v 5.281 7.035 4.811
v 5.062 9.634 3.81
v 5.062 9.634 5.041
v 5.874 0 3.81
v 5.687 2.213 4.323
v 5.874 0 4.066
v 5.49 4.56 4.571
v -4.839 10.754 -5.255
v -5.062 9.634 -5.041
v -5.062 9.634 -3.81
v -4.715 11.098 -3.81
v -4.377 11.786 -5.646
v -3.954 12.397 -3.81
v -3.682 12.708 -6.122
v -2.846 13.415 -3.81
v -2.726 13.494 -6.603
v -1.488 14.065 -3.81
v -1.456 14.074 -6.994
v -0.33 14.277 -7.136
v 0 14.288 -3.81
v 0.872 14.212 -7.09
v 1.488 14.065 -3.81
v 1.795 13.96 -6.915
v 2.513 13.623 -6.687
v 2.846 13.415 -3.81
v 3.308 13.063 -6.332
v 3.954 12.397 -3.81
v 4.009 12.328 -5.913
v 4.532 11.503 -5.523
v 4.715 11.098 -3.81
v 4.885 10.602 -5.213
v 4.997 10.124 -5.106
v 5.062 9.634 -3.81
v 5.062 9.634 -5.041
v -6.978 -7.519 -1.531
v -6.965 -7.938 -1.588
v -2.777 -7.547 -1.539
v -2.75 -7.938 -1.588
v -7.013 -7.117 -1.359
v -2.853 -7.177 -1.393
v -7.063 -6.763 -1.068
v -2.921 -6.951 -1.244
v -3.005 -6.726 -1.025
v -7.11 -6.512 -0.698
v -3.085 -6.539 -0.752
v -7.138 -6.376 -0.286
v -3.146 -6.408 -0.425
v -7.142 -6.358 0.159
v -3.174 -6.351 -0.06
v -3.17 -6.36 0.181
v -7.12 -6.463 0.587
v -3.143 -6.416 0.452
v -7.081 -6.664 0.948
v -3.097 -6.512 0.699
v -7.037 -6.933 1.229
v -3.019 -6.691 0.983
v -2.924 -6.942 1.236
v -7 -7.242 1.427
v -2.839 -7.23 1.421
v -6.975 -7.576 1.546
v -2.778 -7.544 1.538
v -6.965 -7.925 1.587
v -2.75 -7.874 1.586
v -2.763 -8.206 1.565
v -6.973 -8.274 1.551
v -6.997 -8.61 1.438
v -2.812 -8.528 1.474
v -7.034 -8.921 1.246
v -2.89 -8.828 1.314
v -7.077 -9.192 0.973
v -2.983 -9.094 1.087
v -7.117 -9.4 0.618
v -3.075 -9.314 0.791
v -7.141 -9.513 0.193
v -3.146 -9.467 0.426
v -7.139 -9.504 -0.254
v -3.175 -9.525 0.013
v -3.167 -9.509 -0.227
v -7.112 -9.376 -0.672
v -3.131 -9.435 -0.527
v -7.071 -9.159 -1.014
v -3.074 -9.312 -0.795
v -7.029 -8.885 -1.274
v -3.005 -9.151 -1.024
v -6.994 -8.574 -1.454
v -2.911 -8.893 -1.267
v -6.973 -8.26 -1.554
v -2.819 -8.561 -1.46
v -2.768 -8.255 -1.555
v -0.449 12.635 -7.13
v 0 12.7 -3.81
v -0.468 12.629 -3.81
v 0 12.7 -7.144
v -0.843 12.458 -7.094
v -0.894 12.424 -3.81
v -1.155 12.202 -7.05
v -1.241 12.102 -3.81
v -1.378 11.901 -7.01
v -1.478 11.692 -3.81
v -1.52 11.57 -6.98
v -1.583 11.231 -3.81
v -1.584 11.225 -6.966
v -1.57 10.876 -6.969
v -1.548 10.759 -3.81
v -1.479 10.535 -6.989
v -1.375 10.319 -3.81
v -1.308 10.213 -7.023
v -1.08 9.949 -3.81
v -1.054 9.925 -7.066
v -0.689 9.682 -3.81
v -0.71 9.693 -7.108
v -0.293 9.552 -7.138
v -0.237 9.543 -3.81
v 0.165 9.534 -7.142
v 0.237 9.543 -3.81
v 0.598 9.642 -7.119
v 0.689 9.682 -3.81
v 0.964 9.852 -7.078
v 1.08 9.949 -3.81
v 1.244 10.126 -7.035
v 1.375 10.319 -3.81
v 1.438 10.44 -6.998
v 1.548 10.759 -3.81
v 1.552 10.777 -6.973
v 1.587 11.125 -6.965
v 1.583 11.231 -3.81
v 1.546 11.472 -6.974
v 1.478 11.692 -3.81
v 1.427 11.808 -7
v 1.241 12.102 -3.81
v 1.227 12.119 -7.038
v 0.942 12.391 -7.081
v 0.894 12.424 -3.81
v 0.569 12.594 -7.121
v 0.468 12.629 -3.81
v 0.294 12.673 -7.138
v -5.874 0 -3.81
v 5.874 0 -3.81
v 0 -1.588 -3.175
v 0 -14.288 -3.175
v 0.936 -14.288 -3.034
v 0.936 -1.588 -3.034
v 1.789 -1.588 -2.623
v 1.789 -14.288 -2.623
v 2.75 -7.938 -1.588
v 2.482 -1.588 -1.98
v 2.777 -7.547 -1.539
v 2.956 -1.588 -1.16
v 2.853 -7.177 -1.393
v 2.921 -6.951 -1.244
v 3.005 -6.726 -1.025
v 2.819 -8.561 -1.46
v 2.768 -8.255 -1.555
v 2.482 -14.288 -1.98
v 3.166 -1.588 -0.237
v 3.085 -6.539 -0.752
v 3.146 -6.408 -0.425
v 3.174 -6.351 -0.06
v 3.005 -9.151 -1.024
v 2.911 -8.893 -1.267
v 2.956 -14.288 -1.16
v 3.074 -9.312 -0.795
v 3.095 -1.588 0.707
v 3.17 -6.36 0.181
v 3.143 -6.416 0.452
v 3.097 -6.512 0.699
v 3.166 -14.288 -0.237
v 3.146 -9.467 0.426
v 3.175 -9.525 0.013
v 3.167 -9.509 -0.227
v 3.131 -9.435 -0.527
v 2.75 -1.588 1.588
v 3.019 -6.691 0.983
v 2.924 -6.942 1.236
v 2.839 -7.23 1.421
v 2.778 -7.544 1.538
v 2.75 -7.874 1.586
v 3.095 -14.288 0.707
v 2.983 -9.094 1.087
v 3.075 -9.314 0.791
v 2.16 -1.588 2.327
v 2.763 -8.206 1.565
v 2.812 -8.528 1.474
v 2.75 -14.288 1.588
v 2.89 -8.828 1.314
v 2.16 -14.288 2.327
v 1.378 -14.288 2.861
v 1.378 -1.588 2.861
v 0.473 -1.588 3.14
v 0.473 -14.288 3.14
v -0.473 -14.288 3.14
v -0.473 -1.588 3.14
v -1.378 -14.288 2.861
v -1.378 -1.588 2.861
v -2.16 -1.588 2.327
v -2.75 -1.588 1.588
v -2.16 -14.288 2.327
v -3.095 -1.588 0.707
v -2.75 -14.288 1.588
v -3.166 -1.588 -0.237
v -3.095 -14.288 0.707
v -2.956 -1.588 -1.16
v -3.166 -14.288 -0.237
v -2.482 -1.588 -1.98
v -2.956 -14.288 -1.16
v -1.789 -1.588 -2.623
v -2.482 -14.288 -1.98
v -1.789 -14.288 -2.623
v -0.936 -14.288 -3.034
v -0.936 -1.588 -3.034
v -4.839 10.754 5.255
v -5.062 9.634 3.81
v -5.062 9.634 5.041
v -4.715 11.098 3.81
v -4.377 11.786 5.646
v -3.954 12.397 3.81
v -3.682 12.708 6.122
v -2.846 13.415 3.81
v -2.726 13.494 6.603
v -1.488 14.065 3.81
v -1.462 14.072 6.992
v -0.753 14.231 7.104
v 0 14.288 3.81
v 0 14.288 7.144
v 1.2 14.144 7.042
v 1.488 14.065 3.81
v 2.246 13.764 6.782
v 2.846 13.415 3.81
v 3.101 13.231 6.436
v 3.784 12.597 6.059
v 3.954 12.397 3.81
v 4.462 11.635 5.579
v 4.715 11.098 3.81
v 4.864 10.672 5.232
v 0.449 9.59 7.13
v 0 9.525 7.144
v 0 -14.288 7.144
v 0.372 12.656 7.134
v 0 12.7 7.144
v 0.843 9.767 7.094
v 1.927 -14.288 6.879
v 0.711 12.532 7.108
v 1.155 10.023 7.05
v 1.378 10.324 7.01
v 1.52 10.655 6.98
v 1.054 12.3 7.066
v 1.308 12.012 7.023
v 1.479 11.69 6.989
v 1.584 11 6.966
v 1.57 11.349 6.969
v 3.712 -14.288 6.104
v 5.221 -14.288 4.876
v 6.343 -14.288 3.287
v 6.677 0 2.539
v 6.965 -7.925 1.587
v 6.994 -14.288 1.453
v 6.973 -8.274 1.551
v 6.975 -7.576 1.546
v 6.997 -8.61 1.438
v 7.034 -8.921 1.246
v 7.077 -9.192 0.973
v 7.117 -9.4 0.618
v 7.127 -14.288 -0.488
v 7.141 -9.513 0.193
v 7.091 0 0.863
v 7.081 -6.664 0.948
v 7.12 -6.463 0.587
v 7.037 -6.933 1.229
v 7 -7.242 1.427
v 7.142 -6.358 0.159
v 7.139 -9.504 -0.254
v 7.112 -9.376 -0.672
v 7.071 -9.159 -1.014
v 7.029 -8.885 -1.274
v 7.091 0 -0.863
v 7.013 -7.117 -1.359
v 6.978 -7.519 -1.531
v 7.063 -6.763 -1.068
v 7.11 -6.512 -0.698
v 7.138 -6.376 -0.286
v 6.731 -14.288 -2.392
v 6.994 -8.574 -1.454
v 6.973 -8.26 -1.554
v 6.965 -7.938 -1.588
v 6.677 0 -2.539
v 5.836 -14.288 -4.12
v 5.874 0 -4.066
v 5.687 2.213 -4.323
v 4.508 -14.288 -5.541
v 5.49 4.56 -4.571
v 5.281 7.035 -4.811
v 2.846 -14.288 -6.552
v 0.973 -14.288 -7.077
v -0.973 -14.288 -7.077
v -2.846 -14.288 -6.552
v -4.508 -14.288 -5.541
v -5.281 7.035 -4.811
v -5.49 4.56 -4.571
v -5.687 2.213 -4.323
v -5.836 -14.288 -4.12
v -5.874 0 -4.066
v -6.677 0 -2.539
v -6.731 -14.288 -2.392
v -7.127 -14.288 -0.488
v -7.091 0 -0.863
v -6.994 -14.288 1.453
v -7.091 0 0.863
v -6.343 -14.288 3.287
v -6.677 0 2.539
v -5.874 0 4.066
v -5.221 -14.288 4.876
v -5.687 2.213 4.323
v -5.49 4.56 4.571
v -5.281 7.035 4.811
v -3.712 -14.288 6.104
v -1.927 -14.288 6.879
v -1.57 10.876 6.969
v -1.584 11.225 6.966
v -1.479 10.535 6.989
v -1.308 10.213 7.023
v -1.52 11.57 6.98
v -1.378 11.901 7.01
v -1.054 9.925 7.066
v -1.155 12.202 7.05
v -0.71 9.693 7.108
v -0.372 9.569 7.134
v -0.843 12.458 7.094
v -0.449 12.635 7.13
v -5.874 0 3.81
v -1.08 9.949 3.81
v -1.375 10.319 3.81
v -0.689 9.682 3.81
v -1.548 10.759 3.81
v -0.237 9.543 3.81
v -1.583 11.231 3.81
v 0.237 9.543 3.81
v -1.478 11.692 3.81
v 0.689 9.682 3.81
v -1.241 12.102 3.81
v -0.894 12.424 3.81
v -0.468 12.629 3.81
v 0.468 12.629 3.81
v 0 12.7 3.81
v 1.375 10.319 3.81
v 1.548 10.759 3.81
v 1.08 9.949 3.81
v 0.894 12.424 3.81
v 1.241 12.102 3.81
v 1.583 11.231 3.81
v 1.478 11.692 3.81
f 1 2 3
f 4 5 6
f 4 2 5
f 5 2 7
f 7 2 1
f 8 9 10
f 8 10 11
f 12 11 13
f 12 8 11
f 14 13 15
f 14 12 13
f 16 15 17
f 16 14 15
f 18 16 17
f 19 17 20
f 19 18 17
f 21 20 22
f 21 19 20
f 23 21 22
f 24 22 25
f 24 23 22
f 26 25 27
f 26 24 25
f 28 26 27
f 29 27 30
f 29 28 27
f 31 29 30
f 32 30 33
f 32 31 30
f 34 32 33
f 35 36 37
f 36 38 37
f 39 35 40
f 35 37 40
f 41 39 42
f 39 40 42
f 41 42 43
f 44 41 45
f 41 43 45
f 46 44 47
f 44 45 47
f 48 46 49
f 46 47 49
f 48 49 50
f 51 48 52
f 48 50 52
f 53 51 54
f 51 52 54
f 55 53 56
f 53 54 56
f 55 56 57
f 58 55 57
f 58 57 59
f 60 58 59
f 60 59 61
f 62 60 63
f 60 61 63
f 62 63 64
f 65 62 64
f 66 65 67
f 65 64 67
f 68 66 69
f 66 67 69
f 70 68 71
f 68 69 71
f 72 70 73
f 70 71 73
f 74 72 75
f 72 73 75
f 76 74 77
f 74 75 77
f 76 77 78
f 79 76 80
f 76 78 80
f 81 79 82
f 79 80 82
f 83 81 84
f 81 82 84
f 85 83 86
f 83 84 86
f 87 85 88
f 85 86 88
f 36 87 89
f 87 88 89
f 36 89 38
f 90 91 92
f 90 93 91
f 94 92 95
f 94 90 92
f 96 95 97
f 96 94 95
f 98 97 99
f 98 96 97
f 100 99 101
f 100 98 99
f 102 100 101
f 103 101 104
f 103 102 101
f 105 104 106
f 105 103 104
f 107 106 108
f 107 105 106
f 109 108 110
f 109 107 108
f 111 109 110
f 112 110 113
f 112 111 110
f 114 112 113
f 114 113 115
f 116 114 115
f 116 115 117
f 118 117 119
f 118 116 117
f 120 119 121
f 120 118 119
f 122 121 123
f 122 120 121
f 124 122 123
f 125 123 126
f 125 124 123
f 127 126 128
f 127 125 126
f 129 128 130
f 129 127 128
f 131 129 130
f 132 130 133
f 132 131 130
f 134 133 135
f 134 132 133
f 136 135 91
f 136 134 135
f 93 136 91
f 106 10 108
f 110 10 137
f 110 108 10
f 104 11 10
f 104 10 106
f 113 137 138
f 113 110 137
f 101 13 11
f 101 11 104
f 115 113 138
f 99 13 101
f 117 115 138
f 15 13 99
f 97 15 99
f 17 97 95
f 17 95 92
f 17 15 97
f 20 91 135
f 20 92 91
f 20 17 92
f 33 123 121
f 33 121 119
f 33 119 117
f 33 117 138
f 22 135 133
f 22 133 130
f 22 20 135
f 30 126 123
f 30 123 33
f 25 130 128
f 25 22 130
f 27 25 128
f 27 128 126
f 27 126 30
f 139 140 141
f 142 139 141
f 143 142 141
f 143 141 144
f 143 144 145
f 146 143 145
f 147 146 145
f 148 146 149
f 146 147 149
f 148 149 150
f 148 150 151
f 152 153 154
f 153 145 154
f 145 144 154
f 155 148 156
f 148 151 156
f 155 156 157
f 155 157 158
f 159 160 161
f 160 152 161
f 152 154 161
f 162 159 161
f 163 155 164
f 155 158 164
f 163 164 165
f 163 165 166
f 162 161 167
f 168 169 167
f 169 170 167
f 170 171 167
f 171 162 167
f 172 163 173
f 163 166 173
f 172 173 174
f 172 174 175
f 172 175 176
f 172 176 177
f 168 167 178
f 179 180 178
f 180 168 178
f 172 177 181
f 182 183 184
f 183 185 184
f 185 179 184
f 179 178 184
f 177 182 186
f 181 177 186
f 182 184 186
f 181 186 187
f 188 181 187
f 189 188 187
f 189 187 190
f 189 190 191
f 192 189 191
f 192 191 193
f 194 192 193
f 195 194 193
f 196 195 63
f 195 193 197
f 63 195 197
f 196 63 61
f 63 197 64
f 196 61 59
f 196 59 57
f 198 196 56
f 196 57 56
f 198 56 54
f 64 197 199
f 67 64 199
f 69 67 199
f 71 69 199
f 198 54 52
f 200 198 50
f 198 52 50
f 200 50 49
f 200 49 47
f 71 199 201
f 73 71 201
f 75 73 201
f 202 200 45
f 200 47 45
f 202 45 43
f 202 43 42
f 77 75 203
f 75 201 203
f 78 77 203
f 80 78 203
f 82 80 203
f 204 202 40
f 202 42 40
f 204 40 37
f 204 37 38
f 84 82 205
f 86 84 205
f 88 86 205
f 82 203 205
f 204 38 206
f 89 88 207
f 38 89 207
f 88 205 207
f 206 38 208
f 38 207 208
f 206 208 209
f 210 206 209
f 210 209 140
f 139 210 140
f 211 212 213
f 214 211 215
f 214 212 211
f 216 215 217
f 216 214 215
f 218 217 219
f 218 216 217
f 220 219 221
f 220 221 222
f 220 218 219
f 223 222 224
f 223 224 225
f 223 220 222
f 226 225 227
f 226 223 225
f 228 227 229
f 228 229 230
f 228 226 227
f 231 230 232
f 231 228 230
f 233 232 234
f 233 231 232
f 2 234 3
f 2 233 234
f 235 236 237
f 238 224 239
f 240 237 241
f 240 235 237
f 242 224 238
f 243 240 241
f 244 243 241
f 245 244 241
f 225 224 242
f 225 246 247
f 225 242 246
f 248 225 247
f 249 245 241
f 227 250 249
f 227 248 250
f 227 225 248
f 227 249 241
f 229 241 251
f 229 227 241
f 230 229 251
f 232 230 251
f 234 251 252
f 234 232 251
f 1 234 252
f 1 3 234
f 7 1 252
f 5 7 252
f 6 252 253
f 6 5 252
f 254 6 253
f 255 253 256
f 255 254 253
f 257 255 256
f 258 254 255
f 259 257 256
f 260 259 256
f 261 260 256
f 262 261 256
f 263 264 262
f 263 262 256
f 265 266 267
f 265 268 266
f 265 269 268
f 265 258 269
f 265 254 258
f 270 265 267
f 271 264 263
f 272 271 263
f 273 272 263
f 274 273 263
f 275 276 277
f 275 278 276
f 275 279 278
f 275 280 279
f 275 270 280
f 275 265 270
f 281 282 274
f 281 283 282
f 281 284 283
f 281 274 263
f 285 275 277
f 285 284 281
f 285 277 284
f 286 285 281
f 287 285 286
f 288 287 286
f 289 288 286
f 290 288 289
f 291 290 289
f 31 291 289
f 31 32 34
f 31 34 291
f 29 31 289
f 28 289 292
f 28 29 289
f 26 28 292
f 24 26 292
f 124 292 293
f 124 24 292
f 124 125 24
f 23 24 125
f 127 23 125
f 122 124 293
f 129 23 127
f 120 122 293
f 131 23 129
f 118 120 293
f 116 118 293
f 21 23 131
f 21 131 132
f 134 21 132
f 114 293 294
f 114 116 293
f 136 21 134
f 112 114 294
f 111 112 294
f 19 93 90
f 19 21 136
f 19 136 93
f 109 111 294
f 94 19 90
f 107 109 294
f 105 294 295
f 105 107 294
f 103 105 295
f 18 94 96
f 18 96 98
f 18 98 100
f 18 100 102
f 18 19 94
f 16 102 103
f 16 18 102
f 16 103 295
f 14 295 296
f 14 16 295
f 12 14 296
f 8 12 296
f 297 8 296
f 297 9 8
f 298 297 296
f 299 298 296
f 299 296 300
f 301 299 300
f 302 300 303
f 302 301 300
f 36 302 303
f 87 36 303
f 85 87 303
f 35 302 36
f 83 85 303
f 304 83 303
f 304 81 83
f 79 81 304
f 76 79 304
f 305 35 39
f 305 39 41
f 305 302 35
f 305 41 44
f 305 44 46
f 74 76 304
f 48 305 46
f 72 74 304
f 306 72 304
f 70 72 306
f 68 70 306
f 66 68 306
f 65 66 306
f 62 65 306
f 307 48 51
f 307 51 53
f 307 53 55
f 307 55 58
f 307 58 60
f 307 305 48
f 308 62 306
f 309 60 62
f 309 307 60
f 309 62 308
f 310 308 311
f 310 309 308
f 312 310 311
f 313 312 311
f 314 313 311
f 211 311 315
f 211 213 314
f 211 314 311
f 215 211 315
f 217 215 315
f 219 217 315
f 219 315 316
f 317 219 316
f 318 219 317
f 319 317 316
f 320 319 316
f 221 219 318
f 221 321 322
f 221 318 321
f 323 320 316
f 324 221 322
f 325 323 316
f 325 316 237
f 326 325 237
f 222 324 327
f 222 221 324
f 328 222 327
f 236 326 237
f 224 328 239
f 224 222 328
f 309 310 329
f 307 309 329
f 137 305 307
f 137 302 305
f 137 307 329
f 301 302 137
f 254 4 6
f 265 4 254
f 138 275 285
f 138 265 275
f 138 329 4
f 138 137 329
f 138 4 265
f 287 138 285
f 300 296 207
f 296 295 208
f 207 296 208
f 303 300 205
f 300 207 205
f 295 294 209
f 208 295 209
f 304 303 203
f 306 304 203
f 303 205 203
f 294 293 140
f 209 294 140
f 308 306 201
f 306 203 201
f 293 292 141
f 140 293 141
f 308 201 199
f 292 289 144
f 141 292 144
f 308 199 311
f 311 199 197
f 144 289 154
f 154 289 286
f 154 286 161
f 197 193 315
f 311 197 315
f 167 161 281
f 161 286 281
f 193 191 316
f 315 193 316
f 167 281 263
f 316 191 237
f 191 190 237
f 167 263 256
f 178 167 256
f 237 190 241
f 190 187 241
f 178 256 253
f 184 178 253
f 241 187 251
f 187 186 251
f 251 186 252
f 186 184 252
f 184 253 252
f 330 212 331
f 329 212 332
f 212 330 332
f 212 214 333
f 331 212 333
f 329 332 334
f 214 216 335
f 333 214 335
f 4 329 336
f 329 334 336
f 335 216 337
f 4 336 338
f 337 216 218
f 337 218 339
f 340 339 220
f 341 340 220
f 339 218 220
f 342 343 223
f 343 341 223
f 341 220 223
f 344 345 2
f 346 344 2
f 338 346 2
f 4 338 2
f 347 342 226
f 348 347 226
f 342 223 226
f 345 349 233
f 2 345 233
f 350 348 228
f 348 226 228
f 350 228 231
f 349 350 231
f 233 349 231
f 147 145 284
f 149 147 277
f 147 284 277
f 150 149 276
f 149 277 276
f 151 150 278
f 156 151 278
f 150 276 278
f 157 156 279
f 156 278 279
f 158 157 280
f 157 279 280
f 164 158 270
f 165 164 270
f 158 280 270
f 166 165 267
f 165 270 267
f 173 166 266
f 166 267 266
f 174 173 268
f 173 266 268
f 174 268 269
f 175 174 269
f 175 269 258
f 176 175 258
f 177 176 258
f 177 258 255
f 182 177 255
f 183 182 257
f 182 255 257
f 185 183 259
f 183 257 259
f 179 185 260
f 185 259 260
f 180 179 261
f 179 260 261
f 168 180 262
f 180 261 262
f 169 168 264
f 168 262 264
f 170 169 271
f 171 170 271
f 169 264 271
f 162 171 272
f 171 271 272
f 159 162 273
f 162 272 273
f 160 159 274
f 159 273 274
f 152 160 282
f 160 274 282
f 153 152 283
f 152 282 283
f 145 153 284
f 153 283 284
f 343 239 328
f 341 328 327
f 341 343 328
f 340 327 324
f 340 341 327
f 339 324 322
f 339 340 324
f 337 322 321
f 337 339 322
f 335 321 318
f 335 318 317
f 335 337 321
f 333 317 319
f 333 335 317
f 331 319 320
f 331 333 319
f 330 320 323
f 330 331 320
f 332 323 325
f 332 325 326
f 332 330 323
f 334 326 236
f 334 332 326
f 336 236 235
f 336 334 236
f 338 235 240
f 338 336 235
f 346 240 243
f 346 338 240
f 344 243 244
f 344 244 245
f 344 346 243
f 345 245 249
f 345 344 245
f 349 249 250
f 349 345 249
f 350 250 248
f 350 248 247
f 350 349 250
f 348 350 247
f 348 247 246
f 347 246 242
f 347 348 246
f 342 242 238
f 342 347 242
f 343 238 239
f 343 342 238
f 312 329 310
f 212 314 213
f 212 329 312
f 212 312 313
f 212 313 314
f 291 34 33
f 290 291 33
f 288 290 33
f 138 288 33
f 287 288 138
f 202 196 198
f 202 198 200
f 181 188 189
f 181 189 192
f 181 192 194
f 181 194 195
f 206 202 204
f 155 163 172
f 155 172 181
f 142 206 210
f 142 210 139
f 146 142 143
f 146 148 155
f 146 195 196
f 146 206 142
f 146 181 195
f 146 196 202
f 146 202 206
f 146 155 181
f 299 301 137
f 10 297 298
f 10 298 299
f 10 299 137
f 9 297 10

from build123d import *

# Parameters (mm, degrees)
SKETCH1_R               = 7.14375
BOSS_EXTRUDE1_DEPTH     = 14.2875
SKETCH2_R               = 3.175
CUT_EXTRUDE1_DEPTH      = 12.7
SKETCH3_W               = 14.2875
SKETCH3_H               = 7.62
CUT_EXTRUDE2_DEPTH      = 14.2875
CUT_EXTRUDE4_DEPTH      = 18.49854235
CUT_EXTRUDE4_DEPTH_BACK = 18.49854235
CUT_EXTRUDE5_DEPTH      = 18.49854252
CUT_EXTRUDE5_DEPTH_BACK = 18.49854252
SKETCH5_R               = 1.5875
SKETCH6_R               = 1.5875
CUT_EXTRUDE6_DEPTH      = 12.7


with BuildPart() as part:
    # Sketch1 → Boss-Extrude1 (new, symmetric)
    with BuildSketch(Plane(origin=(0, 0, 0), x_dir=(1, 0, 0), z_dir=(0, 1, 0))):
        with Locations(Location((0, 0, 0), (0, 0, 270))):
            Circle(SKETCH1_R)
    extrude(amount=BOSS_EXTRUDE1_DEPTH, both=True)

    # Sketch2 → Cut-Extrude1 (cut)
    with BuildSketch(Plane.XZ.offset(14.2875)):
        with Locations(Location((0, 0, 0), (0, 0, 270))):
            Circle(SKETCH2_R)
    extrude(amount=-CUT_EXTRUDE1_DEPTH, mode=Mode.SUBTRACT)

    # Sketch3 → Cut-Extrude2 (cut)
    with BuildSketch(Plane(origin=(0, 14.2875, 0), x_dir=(1, 0, 0), z_dir=(0, 1, 0))):
        Rectangle(SKETCH3_W, SKETCH3_H)
    extrude(amount=-CUT_EXTRUDE2_DEPTH, mode=Mode.SUBTRACT)

    # Sketch4 → Cut-Extrude4 (cut, two sides: drawn at the far end of the back side and taken through both)
    with BuildSketch(Plane.XY.offset(-CUT_EXTRUDE4_DEPTH_BACK)):
        with BuildLine():
            Line((-57.554902545, 0), (-7.14375, 0))
            Line((-7.14375, 0), (-5.87375, 0))
            Line((-5.87375, 0), (-5.062065416, 9.633990007))
            ThreePointArc((-5.062065416, 9.633990007), (0, 14.2875), (5.062065416, 9.633990007))
            Line((5.062065416, 9.633990007), (5.87375, 0))
            Line((5.87375, 0), (7.14375, 0))
            Line((7.14375, 0), (57.554902545, 0))
            Line((57.554902545, 0), (57.554902545, 100.82230509))
            Line((57.554902545, 100.82230509), (-57.554902545, 100.82230509))
            Line((-57.554902545, 100.82230509), (-57.554902545, 0))
        make_face()
    extrude(amount=CUT_EXTRUDE4_DEPTH + CUT_EXTRUDE4_DEPTH_BACK, mode=Mode.SUBTRACT)

    # Sketch5 → Cut-Extrude5 (cut, two sides: drawn at the far end of the back side and taken through both)
    with BuildSketch(Plane.XY.offset(-CUT_EXTRUDE5_DEPTH_BACK)):
        with Locations(Location((0, 11.1125, 0), (0, 0, 90))):
            Circle(SKETCH5_R)
    extrude(amount=CUT_EXTRUDE5_DEPTH + CUT_EXTRUDE5_DEPTH_BACK, mode=Mode.SUBTRACT)

    # Sketch6 → Cut-Extrude6 (cut, symmetric)
    with BuildSketch(Plane(origin=(0, 0, 0), x_dir=(0, 0, -1), z_dir=(1, 0, 0))):
        with Locations((0, -7.9375)):
            Circle(SKETCH6_R)
    extrude(amount=CUT_EXTRUDE6_DEPTH, both=True, mode=Mode.SUBTRACT)


solid = part.part
